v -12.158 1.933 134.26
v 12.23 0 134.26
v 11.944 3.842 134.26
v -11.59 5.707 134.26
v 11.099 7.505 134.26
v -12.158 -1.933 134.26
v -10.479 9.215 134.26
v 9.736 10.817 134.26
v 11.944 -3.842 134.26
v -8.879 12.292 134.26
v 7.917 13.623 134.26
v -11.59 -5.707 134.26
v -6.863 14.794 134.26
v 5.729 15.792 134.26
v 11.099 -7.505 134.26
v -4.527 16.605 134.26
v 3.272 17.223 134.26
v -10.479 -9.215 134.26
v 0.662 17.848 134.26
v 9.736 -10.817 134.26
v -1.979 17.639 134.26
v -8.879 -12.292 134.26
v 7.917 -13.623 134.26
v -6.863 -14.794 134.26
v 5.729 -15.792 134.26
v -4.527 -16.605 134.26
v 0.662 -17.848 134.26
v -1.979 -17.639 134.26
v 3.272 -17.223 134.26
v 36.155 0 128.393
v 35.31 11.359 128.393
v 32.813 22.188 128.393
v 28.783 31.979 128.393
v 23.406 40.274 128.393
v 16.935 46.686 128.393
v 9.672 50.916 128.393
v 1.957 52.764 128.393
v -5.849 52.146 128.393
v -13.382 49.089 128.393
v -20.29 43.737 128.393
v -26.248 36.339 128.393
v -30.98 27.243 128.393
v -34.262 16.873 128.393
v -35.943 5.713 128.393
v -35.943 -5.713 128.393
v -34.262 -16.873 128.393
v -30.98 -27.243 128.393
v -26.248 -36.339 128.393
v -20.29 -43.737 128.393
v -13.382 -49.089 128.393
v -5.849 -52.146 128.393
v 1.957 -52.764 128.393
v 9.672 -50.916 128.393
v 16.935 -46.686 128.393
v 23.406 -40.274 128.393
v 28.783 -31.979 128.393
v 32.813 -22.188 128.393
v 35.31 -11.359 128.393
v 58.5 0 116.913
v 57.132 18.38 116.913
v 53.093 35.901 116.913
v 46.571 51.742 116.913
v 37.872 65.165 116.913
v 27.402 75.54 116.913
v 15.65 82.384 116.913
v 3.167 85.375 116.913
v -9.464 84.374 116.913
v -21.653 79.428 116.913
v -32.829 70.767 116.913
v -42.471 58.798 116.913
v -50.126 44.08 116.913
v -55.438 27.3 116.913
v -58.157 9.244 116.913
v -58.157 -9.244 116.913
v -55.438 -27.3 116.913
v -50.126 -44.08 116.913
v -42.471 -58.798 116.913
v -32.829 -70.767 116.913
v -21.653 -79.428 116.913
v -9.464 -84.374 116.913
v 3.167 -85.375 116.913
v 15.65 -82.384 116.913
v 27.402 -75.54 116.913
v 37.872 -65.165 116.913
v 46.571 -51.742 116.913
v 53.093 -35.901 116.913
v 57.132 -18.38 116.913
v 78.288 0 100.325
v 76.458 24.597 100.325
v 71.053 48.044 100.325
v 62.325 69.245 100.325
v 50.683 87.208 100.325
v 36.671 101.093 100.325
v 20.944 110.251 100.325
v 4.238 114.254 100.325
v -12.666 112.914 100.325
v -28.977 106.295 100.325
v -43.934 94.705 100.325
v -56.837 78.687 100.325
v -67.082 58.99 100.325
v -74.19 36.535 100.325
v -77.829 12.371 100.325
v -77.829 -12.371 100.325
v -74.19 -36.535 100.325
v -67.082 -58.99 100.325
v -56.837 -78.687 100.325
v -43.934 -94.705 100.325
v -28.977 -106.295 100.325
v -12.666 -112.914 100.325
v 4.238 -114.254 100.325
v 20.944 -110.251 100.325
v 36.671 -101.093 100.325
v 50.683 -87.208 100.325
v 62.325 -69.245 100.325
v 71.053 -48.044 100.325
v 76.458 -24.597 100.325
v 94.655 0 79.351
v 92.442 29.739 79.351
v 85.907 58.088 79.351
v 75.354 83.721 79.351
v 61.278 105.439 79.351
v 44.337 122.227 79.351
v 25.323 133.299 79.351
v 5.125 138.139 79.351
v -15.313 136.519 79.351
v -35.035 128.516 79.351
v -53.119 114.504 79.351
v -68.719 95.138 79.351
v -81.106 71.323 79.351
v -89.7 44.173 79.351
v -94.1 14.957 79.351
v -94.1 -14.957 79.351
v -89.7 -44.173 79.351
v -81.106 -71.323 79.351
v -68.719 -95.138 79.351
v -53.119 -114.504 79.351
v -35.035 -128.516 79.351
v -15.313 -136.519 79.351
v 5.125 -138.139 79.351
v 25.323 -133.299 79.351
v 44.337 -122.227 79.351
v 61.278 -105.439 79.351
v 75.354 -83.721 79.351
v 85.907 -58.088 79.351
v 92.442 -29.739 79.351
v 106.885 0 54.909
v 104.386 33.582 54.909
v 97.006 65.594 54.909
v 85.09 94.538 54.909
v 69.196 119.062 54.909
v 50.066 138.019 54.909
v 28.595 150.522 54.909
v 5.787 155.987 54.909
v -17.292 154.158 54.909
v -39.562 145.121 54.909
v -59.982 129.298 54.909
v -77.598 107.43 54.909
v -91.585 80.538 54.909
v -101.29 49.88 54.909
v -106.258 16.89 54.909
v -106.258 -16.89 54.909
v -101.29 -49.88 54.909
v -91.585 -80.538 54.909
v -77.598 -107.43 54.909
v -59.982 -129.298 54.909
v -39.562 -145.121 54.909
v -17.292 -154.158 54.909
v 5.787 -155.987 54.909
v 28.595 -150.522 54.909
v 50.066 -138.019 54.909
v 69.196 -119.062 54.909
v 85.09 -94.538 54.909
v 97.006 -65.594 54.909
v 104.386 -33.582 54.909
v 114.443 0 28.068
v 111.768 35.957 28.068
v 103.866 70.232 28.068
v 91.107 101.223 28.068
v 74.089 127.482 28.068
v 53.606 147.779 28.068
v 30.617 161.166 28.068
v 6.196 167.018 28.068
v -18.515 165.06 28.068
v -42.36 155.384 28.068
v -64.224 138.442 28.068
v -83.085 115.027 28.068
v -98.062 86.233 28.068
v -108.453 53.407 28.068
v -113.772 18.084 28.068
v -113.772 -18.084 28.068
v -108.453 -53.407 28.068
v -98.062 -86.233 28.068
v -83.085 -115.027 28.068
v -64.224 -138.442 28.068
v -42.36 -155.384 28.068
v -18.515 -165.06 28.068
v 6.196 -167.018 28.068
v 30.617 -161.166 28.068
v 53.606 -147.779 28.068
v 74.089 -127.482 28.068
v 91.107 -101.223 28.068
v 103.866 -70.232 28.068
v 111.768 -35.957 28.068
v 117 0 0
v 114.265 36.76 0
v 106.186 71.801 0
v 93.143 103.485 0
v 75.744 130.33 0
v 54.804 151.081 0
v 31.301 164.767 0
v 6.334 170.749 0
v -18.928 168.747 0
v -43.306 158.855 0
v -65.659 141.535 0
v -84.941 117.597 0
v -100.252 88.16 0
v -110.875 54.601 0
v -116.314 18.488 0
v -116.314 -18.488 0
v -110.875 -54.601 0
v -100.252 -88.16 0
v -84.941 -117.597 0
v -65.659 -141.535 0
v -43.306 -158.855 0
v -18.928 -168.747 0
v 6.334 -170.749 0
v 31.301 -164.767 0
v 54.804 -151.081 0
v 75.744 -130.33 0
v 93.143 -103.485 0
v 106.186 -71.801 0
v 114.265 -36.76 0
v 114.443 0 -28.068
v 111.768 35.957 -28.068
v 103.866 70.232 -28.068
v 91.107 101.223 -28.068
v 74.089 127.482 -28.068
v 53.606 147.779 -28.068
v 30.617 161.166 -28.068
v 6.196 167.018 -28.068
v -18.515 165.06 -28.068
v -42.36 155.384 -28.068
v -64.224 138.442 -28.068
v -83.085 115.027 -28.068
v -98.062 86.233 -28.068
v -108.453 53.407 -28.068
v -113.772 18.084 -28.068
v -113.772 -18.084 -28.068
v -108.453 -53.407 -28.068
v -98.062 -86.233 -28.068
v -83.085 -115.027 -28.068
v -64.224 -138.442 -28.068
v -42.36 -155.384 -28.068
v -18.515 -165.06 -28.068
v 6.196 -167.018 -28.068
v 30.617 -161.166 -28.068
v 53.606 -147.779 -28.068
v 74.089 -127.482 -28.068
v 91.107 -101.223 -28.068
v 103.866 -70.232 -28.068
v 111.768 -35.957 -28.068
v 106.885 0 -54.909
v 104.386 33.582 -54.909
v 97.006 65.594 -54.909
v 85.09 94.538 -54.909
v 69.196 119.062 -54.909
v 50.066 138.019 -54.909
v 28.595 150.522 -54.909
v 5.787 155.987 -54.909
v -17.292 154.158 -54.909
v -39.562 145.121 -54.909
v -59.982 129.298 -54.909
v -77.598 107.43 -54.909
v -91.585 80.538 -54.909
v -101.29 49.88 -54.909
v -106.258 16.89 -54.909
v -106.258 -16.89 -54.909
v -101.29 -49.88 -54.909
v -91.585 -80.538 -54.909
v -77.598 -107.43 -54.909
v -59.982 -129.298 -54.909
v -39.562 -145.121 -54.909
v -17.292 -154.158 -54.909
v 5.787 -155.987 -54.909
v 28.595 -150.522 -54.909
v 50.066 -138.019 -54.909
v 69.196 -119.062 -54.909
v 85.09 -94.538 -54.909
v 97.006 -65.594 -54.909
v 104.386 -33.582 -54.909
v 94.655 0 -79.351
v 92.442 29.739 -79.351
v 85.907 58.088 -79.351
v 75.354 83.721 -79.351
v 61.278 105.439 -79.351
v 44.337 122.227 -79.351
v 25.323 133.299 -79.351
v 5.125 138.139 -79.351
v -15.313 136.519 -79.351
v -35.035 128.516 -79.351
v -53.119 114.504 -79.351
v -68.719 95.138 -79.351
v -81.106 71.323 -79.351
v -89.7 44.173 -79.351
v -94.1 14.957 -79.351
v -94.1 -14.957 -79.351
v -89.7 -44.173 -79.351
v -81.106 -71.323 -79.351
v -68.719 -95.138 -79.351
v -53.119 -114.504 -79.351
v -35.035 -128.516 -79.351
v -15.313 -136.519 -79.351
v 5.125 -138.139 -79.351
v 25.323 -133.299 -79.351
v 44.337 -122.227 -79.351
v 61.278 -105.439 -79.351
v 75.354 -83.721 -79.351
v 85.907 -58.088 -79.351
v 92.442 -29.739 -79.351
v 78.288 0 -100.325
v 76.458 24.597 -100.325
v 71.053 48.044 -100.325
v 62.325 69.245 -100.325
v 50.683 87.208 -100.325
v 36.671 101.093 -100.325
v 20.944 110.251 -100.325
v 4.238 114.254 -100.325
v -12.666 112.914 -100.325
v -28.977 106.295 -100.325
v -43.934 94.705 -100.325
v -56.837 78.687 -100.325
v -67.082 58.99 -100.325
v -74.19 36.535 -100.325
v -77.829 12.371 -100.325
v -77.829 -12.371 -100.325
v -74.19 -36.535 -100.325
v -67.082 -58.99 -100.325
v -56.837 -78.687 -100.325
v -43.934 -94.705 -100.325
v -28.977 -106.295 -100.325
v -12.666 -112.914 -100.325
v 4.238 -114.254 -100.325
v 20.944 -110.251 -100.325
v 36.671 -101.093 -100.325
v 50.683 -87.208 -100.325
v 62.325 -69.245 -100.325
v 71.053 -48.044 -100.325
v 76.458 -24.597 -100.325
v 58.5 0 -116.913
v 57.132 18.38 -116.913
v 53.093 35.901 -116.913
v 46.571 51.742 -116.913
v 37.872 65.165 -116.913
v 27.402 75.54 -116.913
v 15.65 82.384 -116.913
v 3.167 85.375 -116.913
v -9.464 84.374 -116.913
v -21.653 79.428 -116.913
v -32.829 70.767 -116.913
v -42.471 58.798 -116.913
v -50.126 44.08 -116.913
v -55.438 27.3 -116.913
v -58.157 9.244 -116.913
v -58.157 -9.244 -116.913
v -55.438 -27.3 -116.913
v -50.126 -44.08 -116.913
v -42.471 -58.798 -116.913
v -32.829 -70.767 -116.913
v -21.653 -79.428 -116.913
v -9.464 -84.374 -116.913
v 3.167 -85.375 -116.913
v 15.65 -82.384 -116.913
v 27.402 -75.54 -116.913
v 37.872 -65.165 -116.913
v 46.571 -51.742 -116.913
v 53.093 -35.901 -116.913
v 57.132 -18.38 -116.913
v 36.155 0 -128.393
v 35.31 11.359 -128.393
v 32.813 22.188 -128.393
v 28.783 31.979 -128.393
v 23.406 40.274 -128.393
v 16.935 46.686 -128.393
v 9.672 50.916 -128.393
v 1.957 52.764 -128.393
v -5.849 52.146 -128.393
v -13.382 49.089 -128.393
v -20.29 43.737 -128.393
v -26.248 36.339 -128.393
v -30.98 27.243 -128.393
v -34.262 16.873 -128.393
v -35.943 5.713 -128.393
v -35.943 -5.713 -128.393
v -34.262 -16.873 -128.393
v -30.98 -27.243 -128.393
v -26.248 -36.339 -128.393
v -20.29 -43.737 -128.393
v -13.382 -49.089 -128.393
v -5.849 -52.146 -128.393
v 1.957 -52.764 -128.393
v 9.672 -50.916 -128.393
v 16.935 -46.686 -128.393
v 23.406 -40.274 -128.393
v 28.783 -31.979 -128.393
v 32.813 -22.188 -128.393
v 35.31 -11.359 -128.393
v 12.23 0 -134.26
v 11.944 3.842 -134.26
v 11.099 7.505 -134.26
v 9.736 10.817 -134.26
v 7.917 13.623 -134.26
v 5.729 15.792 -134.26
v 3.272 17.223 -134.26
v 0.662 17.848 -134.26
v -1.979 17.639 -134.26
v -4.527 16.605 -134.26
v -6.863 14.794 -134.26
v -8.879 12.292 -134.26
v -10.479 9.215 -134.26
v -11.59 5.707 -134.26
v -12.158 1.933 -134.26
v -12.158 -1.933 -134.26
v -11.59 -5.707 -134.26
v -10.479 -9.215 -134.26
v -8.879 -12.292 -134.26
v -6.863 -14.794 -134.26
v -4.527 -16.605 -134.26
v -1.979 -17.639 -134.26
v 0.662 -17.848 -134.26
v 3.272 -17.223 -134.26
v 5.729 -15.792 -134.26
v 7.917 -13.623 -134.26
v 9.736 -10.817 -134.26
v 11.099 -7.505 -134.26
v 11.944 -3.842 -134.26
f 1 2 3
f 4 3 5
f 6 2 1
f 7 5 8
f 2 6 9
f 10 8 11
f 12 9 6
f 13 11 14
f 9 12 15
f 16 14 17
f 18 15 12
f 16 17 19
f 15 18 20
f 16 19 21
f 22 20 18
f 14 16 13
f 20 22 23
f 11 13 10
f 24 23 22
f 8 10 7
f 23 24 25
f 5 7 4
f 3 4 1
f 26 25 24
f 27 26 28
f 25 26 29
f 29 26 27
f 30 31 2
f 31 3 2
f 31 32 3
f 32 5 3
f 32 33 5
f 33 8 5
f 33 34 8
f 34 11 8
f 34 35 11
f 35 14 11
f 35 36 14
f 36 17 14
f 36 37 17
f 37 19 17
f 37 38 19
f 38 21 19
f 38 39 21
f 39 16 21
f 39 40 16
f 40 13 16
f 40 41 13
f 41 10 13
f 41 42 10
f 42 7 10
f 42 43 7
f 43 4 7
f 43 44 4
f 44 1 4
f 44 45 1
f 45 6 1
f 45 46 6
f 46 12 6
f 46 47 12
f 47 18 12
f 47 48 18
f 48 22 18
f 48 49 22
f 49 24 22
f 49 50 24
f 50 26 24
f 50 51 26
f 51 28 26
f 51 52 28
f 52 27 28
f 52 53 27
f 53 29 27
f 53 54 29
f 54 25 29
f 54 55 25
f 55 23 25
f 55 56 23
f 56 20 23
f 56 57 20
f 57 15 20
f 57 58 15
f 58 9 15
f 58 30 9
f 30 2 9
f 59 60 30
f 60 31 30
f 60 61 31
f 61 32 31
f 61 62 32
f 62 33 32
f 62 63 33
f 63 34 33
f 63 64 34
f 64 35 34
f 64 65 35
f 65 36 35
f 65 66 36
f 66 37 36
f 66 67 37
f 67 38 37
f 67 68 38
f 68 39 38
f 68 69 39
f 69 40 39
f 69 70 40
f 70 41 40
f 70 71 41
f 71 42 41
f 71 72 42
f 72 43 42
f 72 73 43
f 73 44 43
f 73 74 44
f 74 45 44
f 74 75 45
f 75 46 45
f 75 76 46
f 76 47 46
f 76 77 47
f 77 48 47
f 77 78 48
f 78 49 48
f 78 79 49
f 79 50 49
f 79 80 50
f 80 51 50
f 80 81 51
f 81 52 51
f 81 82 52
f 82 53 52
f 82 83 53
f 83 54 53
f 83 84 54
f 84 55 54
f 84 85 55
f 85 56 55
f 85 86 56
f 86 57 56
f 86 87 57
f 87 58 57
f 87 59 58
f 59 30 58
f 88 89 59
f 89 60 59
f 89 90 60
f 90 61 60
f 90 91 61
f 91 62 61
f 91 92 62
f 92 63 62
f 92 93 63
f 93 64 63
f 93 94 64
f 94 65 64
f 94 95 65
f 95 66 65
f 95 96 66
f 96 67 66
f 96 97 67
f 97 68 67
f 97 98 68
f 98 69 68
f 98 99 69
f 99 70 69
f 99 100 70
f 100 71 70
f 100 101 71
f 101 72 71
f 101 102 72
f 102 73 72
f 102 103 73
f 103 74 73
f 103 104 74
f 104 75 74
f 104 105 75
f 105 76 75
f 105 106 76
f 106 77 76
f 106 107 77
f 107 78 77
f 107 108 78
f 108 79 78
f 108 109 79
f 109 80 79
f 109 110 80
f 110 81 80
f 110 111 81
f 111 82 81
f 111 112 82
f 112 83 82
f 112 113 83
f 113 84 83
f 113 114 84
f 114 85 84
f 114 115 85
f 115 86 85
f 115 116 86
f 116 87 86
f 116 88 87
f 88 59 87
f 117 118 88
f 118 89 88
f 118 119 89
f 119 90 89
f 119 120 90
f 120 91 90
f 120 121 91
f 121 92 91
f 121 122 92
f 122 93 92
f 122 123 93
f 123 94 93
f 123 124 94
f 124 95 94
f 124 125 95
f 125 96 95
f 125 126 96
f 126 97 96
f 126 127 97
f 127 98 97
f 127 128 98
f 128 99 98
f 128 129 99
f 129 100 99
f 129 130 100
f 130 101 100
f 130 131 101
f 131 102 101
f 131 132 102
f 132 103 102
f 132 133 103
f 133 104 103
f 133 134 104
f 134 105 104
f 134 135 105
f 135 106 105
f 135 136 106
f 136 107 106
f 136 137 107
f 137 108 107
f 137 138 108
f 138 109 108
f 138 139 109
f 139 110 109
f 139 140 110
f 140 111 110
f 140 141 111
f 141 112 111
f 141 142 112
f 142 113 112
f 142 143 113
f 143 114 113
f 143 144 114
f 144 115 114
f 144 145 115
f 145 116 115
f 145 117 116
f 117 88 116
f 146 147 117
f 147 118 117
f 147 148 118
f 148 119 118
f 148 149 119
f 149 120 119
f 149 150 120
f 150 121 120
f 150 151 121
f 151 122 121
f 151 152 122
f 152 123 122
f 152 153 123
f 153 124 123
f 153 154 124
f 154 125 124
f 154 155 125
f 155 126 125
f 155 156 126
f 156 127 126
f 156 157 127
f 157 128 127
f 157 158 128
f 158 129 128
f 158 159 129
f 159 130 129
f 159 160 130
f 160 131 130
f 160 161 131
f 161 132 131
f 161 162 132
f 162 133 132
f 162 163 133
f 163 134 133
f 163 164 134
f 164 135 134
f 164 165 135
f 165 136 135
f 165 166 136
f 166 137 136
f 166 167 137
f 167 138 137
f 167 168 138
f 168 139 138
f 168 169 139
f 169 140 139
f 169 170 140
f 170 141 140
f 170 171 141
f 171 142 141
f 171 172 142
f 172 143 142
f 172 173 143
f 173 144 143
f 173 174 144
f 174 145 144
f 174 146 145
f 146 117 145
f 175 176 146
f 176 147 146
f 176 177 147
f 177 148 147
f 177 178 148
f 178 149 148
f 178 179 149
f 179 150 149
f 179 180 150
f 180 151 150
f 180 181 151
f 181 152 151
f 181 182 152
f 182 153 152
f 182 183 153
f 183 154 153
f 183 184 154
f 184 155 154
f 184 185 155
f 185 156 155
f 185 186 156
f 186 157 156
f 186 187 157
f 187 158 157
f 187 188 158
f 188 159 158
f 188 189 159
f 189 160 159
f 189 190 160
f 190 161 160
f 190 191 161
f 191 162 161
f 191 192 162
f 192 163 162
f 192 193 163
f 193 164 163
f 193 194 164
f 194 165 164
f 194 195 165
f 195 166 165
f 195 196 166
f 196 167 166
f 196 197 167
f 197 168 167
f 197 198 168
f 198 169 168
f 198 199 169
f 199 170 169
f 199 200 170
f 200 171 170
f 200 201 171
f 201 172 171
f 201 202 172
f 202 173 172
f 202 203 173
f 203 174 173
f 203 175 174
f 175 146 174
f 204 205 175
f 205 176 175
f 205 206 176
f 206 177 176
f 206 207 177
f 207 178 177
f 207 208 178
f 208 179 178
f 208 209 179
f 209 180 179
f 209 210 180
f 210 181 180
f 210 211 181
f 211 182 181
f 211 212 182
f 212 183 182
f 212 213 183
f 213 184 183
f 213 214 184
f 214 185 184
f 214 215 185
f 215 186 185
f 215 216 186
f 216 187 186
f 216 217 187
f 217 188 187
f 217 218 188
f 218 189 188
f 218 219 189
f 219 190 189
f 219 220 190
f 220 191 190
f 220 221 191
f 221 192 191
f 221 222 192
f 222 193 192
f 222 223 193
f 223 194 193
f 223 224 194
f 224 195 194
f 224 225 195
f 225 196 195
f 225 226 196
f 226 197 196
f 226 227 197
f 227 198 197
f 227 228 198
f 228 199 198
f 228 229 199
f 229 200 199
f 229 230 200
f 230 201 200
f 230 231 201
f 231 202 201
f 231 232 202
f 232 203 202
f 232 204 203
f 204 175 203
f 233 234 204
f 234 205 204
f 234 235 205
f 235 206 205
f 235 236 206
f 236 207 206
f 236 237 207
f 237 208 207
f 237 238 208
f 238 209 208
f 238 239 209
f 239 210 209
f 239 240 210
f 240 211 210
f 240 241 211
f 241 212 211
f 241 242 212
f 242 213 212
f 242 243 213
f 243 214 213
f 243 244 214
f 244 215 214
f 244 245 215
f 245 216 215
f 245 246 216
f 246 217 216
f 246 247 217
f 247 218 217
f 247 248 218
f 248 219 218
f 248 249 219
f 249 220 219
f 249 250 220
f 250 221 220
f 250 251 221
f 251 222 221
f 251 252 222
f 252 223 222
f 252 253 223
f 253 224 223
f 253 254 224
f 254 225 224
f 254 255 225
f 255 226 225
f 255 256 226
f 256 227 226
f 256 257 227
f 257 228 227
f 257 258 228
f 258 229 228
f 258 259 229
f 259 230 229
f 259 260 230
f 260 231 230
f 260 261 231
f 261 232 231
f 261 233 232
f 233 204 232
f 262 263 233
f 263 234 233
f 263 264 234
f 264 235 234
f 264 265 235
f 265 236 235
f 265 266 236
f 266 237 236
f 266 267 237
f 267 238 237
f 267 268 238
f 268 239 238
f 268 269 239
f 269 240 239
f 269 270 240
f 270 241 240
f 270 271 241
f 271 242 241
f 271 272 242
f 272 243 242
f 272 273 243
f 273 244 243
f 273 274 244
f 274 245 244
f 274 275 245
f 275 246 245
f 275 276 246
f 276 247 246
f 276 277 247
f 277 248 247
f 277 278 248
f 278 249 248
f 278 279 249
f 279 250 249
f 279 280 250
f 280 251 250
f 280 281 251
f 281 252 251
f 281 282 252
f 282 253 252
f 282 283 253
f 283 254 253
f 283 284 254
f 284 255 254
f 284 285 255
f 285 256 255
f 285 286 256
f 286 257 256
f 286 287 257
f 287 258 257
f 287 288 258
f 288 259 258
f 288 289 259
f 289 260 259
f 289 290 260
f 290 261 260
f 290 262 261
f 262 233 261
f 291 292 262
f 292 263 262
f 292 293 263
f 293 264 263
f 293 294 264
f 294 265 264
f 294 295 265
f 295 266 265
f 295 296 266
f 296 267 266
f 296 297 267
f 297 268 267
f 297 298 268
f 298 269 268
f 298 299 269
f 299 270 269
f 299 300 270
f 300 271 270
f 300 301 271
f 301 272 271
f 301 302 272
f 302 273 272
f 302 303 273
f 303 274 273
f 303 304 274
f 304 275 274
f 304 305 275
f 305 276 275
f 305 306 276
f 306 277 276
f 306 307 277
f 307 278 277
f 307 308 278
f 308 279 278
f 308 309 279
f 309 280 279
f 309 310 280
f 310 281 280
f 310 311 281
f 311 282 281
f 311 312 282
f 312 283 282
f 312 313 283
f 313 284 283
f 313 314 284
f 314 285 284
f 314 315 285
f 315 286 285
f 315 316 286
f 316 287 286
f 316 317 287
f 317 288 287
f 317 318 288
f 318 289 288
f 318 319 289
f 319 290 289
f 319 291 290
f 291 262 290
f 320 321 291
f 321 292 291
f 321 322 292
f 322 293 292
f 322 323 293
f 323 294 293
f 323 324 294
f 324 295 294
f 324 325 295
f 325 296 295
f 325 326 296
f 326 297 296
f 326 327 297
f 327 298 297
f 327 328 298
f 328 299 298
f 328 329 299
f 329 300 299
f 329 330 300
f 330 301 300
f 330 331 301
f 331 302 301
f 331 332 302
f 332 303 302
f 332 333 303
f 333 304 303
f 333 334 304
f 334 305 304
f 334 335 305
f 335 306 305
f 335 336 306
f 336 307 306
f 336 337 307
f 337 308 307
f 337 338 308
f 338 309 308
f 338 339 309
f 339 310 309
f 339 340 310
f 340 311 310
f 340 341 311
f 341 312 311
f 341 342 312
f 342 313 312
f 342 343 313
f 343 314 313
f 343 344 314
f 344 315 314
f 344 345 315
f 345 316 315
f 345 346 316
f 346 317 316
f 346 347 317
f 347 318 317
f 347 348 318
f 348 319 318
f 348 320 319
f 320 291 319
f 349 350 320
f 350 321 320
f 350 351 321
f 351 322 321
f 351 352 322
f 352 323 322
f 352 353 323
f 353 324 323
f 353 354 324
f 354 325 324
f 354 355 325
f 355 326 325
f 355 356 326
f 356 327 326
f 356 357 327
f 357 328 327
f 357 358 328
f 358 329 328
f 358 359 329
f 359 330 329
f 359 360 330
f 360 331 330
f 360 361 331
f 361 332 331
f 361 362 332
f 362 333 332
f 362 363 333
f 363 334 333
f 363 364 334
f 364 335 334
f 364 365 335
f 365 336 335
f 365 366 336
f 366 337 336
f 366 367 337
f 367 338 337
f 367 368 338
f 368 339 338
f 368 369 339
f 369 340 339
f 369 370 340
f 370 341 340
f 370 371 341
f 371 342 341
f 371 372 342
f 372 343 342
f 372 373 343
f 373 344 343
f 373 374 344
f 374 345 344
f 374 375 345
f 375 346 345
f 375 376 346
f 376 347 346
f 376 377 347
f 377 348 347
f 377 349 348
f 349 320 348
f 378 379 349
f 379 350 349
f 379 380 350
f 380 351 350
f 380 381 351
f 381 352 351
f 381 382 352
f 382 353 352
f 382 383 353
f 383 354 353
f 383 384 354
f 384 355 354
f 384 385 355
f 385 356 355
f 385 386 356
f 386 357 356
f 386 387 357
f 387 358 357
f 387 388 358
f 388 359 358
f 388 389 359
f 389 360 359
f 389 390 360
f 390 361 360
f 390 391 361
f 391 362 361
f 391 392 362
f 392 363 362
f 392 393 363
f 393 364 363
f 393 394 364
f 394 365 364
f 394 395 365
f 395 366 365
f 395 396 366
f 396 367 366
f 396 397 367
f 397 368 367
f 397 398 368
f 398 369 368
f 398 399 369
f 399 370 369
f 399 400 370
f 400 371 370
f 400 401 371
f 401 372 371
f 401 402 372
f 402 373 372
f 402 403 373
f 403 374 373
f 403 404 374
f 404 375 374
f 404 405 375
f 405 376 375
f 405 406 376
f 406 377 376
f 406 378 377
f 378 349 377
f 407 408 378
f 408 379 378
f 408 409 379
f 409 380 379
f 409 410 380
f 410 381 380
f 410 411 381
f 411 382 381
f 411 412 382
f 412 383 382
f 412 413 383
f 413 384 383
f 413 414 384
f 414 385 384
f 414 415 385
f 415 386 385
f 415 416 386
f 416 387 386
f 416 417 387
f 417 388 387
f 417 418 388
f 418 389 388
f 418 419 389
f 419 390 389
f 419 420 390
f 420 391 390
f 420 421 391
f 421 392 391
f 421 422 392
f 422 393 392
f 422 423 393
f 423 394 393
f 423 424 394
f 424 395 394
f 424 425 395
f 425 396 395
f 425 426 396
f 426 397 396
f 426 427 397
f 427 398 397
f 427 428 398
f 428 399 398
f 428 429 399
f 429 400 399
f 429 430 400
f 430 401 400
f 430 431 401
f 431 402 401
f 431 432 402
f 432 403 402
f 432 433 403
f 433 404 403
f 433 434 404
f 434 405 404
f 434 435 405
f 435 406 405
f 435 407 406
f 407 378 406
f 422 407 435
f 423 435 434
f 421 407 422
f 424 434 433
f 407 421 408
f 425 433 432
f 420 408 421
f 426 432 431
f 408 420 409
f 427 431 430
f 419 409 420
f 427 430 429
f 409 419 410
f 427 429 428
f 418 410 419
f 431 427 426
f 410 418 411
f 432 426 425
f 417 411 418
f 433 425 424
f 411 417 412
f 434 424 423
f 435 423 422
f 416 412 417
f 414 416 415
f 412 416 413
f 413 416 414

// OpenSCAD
// Generated by SolidPython 1.0.1 on 2020-07-29 00:46:51


scale(v = [13, 19, 15]) {
	sphere(r = 9);
}
/***********************************************
*********      SolidPython code:      **********
************************************************
 
# import packages: SolidPython
from solid import *
from solid.utils import *
from itertools import chain, combinations, permutations


class Resize:

    def __init__(self, scad_file):
        self.scad_file = scad_file
        #self.scad_file = import_scad(scad_file)
        # cone/cylinder param:
        self.r1 = 0
        self.r2 = 0
        self.h = 0
        # rectangular prism param:
        self.w = 0
        self.l = 0
        # ellipse param:
        self.r = 0

    # import OpenScad code (file name corresponds to shape)


    # classify shape + parameters
    def assign(self, param1, param2, param3):
        if self.scad_file == 'cone.scad':
            self.r1 = param1
            self.r2 = param2
            self.h = param3
        elif self.scad_file == 'cylinder.scad':
            self.r1 = param1
            self.r2 = param2
            self.h = param3
        elif self.scad_file == 'rectangularPrism.scad':
            self.h = param1
            self.l = param2
            self.w = param3
        else:
            self.r = param1
            self.h = param2

    # resize parameters
    def iterate(self):
        x = range(3, 20, 2)
        i = 1
        if self.scad_file == 'cone.scad':
            tempList = list(permutations(x, 2))
            for temp in tempList:
                param1 = temp[0]
                param2 = temp[1]
                filepath = 'produced_scad_files/' + 'cone' + str(param1) + '_' + str(param2) + '_' + '.scad'
                scad_render_to_file(cylinder(h=param1, r1=param2, r2=0), filepath)

        elif self.scad_file == 'cylinder.scad':
            tempList = list(permutations(x, 3))
            for temp in tempList:
                param1 = temp[0]
                param2 = temp[1]
                filepath = 'produced_scad_files/' + 'cylinder' + str(param1) + '_' + str(param2) + '_' + '.scad'
                scad_render_to_file(cylinder(h=param1, r1=param2, r2=param2), filepath)

        elif self.scad_file == 'rectangularPrism.scad':
            tempList = list(permutations(x, 3))
            for temp in tempList:
                param1 = temp[0]
                param2 = temp[1]
                param3 = temp[2]
                filepath = 'produced_scad_files/' + 'rectangularPrism' + str(param1) + '_' + str(param2) + '_' + str(
                    param3) + '.scad'
                scad_render_to_file(cube(size=(param1, param2, param3)), filepath)

        elif self.scad_file == 'ellipse.scad':
            tempList = list(permutations(x, 4))
            for temp in tempList:
                param1 = temp[0]
                param2 = temp[1]
                param3 = temp[2]
                param4 = temp[3]
                filepath = 'produced_scad_files/' + 'ellipse' + str(param1) + '_' + str(param2) + '_' + str(param3) + '_' + str(param4) + '.scad'
                scad_render_to_file(scale([param1, param2, param3])(sphere(r=param4)), filepath)

    def render_to_scadfile(self):
        scad_render_to_file(scad, 'example.scad') 
 
************************************************/
